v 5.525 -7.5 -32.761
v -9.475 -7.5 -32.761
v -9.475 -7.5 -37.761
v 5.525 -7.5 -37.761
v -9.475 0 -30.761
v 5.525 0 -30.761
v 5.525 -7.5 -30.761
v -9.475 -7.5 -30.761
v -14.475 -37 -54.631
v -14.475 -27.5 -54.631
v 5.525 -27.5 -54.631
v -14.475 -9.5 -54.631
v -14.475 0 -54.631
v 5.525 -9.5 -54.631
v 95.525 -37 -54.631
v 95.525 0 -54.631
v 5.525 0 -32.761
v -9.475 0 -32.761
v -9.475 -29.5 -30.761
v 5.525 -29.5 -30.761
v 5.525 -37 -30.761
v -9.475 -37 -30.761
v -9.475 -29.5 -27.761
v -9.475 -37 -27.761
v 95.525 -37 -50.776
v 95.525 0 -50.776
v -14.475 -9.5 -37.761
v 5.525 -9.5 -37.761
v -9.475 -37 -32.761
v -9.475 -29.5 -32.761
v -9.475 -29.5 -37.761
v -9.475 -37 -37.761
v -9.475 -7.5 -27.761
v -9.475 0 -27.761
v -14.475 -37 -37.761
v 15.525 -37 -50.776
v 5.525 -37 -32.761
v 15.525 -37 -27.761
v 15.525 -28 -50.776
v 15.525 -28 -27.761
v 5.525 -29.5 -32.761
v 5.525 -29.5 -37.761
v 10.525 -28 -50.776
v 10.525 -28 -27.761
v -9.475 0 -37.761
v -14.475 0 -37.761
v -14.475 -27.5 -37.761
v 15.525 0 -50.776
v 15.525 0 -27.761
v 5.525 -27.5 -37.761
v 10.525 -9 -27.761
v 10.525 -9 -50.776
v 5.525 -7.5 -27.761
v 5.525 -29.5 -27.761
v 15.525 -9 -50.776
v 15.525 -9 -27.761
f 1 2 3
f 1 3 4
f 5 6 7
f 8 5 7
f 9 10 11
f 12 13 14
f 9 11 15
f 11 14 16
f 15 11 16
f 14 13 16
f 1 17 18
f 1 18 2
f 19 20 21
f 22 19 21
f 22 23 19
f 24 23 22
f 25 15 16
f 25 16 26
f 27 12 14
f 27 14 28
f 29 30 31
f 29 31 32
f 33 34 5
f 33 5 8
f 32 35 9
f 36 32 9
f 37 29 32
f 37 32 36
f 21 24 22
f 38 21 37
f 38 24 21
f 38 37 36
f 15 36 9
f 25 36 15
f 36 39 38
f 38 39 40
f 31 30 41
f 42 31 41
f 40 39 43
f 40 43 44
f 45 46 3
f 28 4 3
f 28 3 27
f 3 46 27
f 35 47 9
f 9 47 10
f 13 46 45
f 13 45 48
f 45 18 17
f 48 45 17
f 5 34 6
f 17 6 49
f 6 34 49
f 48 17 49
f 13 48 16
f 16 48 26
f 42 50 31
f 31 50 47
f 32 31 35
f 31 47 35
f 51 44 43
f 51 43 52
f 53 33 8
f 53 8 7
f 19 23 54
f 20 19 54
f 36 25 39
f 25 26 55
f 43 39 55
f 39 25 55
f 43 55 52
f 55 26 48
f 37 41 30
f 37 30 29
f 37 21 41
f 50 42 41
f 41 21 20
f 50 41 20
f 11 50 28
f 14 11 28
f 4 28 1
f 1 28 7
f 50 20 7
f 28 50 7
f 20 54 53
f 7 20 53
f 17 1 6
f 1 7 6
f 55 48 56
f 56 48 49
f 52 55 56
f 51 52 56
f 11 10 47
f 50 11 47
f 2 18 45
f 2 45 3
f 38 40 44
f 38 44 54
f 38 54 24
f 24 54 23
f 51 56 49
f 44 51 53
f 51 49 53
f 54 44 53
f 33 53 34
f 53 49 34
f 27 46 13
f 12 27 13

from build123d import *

# Parameters (mm, degrees)
F1_DEPTH  = 37
F2_W      = 19
F2_H      = 23.015723977
F3_DEPTH  = 5
F4_W      = 18
F4_H      = 26.8701749424
F5_DEPTH  = 20
F6_W      = 37
F6_H      = 2
F7_DEPTH  = 20
F8_W      = 37
F8_H      = 10
F9_DEPTH  = 5
F10_W     = 20
F10_H     = 22
F11_DEPTH = 10


with BuildPart() as f1:
    # F0 (on Front) → F1 (new body)
    with BuildSketch(Plane.XZ):
        Polygon((15.5247052472, -27.7605104941), (-14.4752947528, -27.7605104941), (-14.4752947528, -54.6306854365), (15.5247052472, -54.6306854365), (95.5247052472, -54.6306854365), (95.5247052472, -50.776234471), (15.5247052472, -50.776234471), align=None)
    extrude(amount=F1_DEPTH)

    # F2 (on face) → F3 (cut)
    with BuildSketch(Plane.YZ.offset(15.5247052472)):
        with Locations((-18.5, -39.2683724826)):
            Rectangle(F2_W, F2_H)
    extrude(amount=-F3_DEPTH, mode=Mode.SUBTRACT)

    # F4 (on face) → F5 (cut)
    with BuildSketch(Plane(origin=(-14.4752947528, 0, 0), x_dir=(0, -1, 0), z_dir=(-1, 0, 0))):
        with Locations((18.5, -41.1955979653)):
            Rectangle(F4_W, F4_H)
    extrude(amount=-F5_DEPTH, mode=Mode.SUBTRACT)

    # F6 (on face) → F7 (cut, through all)
    with BuildSketch(Plane(origin=(-14.4752947528, 0, 0), x_dir=(0, -1, 0), z_dir=(-1, 0, 0))):
        with Locations((18.5, -31.7605104941)):
            Rectangle(F6_W, F6_H)
    extrude(amount=-F7_DEPTH, mode=Mode.SUBTRACT)

    # F8 (on face) → F9 (cut)
    with BuildSketch(Plane(origin=(-14.4752947528, 0, 0), x_dir=(0, -1, 0), z_dir=(-1, 0, 0))):
        with Locations((18.5, -32.7605104941)):
            Rectangle(F8_W, F8_H)
    extrude(amount=-F9_DEPTH, mode=Mode.SUBTRACT)

    # F10 (on face) → F11 (cut, through all)
    with BuildSketch(Plane.XY.offset(-27.7605104941)):
        with Locations((-4.4752947528, -18.5)):
            Rectangle(F10_W, F10_H)
    extrude(amount=-F11_DEPTH, mode=Mode.SUBTRACT)


solid = f1.part
